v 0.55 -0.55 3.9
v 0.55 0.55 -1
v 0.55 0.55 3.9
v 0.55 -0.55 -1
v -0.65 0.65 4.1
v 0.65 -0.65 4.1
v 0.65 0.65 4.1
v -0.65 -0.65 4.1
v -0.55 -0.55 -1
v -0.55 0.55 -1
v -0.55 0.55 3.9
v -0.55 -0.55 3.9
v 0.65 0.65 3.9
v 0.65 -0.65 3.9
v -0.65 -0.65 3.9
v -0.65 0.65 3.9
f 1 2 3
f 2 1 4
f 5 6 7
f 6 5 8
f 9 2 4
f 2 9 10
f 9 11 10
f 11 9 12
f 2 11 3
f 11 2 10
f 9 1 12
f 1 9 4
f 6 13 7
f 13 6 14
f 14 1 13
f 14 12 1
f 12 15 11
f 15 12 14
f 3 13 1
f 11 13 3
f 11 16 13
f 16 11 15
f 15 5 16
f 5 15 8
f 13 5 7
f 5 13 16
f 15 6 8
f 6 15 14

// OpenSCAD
// file: lib/lodge_kit.scad
// Lodge shell tile kit — shared dimensions and modules.
//
// The game paints a lodge footprint in 5 m cells and resolves the
// exterior from these tiles at half-cell (2.5 m) resolution; see
// internal/world/lodge_shell.go. Every tile is authored in the same
// canonical frame:
//
//   * origin on the lodge floor plane (Z = 0);
//   * wall-type tiles sit on a footprint edge, centred on it, with the
//     OUTSIDE toward SCAD −Y (game +Z) and the wall thickness toward +Y;
//   * roof tiles are centred on a half-cell, with Z = 0 at the tile's
//     lowest corner; slopes fall toward −Y (game +Z);
//   * corner tiles sit on a grid vertex; an outer corner's building is
//     in the SCAD (−X, +Y) quadrant, an inner corner's notch in (+X, −Y).
//
// Colours are near-neutral: the renderer tints walls and roofs per lodge
// from a seeded palette (world.ShellPalette).
//
// Keep these in sync with the constants in lodge_shell.go.

tile   = 2.5;   // ShellTileSize
wall_h = 5.0;   // ShellWallHeight
rise   = 2.1;   // ShellRoofRise, per tile of run
pitch  = rise / tile;

wall_t   = 0.35;  // wall thickness
sink     = 1.5;   // walls run this far below the floor to hide pad grading
roof_t   = 0.25;  // roof slab thickness
overhang = 0.7;   // eaves overhang past the wall plane

c_wall   = [0.92, 0.90, 0.86];
c_stone  = [0.62, 0.61, 0.60];
c_trim   = [0.97, 0.97, 0.95];
c_glass  = [0.30, 0.42, 0.52];
c_door   = [0.36, 0.25, 0.18];
c_roof   = [0.97, 0.97, 0.97];
c_fascia = [0.55, 0.52, 0.50];

// Plain wall panel: timber above a stone plinth, a trim band under the
// eaves.
module wall_panel() {
    color(c_wall)
        translate([-tile/2, 0, -sink]) cube([tile, wall_t, wall_h + sink]);
    color(c_stone)
        translate([-tile/2, -0.06, -sink]) cube([tile, wall_t, sink + 0.7]);
    color(c_trim)
        translate([-tile/2, -0.04, wall_h - 0.3]) cube([tile, 0.1, 0.3]);
    battens();
}

// Horizontal board lines above the plinth.
module battens() {
    color(c_wall * 0.8)
        for (z = [1.3 : 0.6 : wall_h - 0.6])
            translate([-tile/2, -0.03, z]) cube([tile, 0.04, 0.06]);
}

// A framed pane on the outer face. x0/w along the wall, z0/h up it.
module pane(x0, w, z0, h) {
    color(c_trim)
        translate([x0 - 0.1, -0.05, z0 - 0.1]) cube([w + 0.2, 0.06, h + 0.2]);
    color(c_glass)
        translate([x0, -0.08, z0]) cube([w, 0.06, h]);
}

module wall_window() {
    wall_panel();
    pane(-0.7, 1.4, 1.4, 2.2);
    color(c_trim) translate([-0.02, -0.1, 1.4]) cube([0.04, 0.04, 2.2]); // mullion
}

// Tall window flanked by shutters.
module wall_window_alt() {
    wall_panel();
    pane(-0.5, 1.0, 1.2, 2.8);
    color(c_door) {
        translate([-1.0, -0.1, 1.2]) cube([0.4, 0.05, 2.8]);
        translate([ 0.6, -0.1, 1.2]) cube([0.4, 0.05, 2.8]);
    }
}

// Floor-to-eave glazing for food courts: a low stone sill, then glass in
// three lights.
module wall_glazed() {
    color(c_wall)
        translate([-tile/2, 0, -sink]) cube([tile, wall_t, wall_h + sink]);
    color(c_stone)
        translate([-tile/2, -0.06, -sink]) cube([tile, wall_t, sink + 0.35]);
    color(c_glass)
        translate([-tile/2, -0.09, 0.35]) cube([tile, 0.06, wall_h - 0.75]);
    color(c_trim) {
        for (x = [-tile/2, -tile/6, tile/6, tile/2 - 0.08])
            translate([x, -0.12, 0.35]) cube([0.08, 0.06, wall_h - 0.75]);
        translate([-tile/2, -0.12, wall_h - 0.45]) cube([tile, 0.07, 0.1]);
    }
}

// Glazed entry door under a small canopy, with a step.
module door() {
    color(c_wall)
        translate([-tile/2, 0, -sink]) cube([tile, wall_t, wall_h + sink]);
    color(c_stone)
        translate([-tile/2, -0.06, -sink]) cube([tile, wall_t, sink + 0.15]);
    battens();
    color(c_door)
        translate([-0.9, -0.1, 0]) cube([1.8, 0.1, 2.7]);
    color(c_glass) {
        translate([-0.75, -0.13, 0.9]) cube([0.65, 0.05, 1.6]);
        translate([ 0.10, -0.13, 0.9]) cube([0.65, 0.05, 1.6]);
    }
    color(c_trim)
        translate([-tile/2, -0.04, wall_h - 0.3]) cube([tile, 0.1, 0.3]);
    color(c_roof)   // canopy
        translate([-1.2, -1.3, 3.0])
            rotate([-12, 0, 0]) cube([2.4, 1.3, 0.12]);
    color(c_stone)  // step
        translate([-1.1, -0.9, -0.3]) cube([2.2, 0.9, 0.42]);
}

module corner_outer() {
    color(c_stone)
        translate([-0.3, -0.05, -sink]) cube([0.35, 0.35, wall_h + sink - 0.3]);
}

module corner_inner() {
    color(c_trim)
        translate([0, -0.12, 0]) cube([0.12, 0.12, wall_h - 0.3]);
}

// Roof slab over one half-cell. h lists corner heights (in rise units)
// in SCAD order (−X,+Y), (+X,+Y), (+X,−Y), (−X,−Y); split names which
// diagonal the top surface folds along: 0 through corners 0–2, 1
// through corners 1–3.
module roof_tile(h, split) {
    p = [[-tile/2, tile/2], [tile/2, tile/2], [tile/2, -tile/2], [-tile/2, -tile/2]];
    top = [for (i = [0:3]) [p[i][0], p[i][1], h[i] * rise]];
    bot = [for (i = [0:3]) [p[i][0], p[i][1], h[i] * rise - roof_t]];
    tris = split == 0 ? [[0, 1, 2], [0, 2, 3]] : [[0, 1, 3], [1, 2, 3]];
    color(c_roof)
        polyhedron(
            points = concat(top, bot),
            faces = concat(
                // top (clockwise seen from above = outward in OpenSCAD)
                [for (t = tris) [t[0], t[1], t[2]]],
                [for (t = tris) [t[2] + 4, t[1] + 4, t[0] + 4]],
                [for (i = [0:3]) [i, i + 4, (i + 1) % 4 + 4, (i + 1) % 4]]
            ));
}

// Eaves strip past a wall edge: continues the roof plane outward and
// down, finished with a fascia board.
module eave() {
    drop = overhang * pitch;
    color(c_roof)
        polyhedron(
            points = [
                [-tile/2, 0, 0], [tile/2, 0, 0], [tile/2, -overhang, -drop], [-tile/2, -overhang, -drop],
                [-tile/2, 0, -roof_t], [tile/2, 0, -roof_t], [tile/2, -overhang, -drop - roof_t], [-tile/2, -overhang, -drop - roof_t],
            ],
            faces = [[0, 1, 2, 3], [7, 6, 5, 4], [0, 4, 5, 1], [1, 5, 6, 2], [2, 6, 7, 3], [3, 7, 4, 0]]);
    color(c_fascia)
        translate([-tile/2, -overhang - 0.05, -drop - roof_t - 0.1]) cube([tile, 0.08, roof_t + 0.2]);
}

// Eaves in the square past an outer corner: a hip folding along the
// diagonal away from the building.
module eave_corner() {
    o = overhang;
    d = o * pitch;
    color(c_roof)
        polyhedron(
            points = [
                [0, 0, 0], [o, 0, -d], [o, -o, -d], [0, -o, -d],
                [0, 0, -roof_t], [o, 0, -d - roof_t], [o, -o, -d - roof_t], [0, -o, -d - roof_t],
            ],
            faces = [[0, 1, 2], [0, 2, 3], [6, 5, 4], [7, 6, 4], [0, 4, 5, 1], [1, 5, 6, 2], [2, 6, 7, 3], [3, 7, 4, 0]]);
    color(c_fascia) {
        translate([0, -o - 0.05, -d - roof_t - 0.1]) cube([o + 0.05, 0.08, roof_t + 0.2]);
        translate([o - 0.03, -o - 0.05, -d - roof_t - 0.1]) cube([0.08, o + 0.05, roof_t + 0.2]);
    }
}

module chimney() {
    color(c_stone)
        translate([-0.55, -0.55, -1.0]) cube([1.1, 1.1, rise + 3.0]);
    color(c_fascia)
        translate([-0.65, -0.65, rise + 1.8]) cube([1.3, 1.3, 0.2]);
}
// main file
// Lodge shell kit: stone chimney. See lib/lodge_kit.scad.
include <lib/lodge_kit.scad>
chimney();
